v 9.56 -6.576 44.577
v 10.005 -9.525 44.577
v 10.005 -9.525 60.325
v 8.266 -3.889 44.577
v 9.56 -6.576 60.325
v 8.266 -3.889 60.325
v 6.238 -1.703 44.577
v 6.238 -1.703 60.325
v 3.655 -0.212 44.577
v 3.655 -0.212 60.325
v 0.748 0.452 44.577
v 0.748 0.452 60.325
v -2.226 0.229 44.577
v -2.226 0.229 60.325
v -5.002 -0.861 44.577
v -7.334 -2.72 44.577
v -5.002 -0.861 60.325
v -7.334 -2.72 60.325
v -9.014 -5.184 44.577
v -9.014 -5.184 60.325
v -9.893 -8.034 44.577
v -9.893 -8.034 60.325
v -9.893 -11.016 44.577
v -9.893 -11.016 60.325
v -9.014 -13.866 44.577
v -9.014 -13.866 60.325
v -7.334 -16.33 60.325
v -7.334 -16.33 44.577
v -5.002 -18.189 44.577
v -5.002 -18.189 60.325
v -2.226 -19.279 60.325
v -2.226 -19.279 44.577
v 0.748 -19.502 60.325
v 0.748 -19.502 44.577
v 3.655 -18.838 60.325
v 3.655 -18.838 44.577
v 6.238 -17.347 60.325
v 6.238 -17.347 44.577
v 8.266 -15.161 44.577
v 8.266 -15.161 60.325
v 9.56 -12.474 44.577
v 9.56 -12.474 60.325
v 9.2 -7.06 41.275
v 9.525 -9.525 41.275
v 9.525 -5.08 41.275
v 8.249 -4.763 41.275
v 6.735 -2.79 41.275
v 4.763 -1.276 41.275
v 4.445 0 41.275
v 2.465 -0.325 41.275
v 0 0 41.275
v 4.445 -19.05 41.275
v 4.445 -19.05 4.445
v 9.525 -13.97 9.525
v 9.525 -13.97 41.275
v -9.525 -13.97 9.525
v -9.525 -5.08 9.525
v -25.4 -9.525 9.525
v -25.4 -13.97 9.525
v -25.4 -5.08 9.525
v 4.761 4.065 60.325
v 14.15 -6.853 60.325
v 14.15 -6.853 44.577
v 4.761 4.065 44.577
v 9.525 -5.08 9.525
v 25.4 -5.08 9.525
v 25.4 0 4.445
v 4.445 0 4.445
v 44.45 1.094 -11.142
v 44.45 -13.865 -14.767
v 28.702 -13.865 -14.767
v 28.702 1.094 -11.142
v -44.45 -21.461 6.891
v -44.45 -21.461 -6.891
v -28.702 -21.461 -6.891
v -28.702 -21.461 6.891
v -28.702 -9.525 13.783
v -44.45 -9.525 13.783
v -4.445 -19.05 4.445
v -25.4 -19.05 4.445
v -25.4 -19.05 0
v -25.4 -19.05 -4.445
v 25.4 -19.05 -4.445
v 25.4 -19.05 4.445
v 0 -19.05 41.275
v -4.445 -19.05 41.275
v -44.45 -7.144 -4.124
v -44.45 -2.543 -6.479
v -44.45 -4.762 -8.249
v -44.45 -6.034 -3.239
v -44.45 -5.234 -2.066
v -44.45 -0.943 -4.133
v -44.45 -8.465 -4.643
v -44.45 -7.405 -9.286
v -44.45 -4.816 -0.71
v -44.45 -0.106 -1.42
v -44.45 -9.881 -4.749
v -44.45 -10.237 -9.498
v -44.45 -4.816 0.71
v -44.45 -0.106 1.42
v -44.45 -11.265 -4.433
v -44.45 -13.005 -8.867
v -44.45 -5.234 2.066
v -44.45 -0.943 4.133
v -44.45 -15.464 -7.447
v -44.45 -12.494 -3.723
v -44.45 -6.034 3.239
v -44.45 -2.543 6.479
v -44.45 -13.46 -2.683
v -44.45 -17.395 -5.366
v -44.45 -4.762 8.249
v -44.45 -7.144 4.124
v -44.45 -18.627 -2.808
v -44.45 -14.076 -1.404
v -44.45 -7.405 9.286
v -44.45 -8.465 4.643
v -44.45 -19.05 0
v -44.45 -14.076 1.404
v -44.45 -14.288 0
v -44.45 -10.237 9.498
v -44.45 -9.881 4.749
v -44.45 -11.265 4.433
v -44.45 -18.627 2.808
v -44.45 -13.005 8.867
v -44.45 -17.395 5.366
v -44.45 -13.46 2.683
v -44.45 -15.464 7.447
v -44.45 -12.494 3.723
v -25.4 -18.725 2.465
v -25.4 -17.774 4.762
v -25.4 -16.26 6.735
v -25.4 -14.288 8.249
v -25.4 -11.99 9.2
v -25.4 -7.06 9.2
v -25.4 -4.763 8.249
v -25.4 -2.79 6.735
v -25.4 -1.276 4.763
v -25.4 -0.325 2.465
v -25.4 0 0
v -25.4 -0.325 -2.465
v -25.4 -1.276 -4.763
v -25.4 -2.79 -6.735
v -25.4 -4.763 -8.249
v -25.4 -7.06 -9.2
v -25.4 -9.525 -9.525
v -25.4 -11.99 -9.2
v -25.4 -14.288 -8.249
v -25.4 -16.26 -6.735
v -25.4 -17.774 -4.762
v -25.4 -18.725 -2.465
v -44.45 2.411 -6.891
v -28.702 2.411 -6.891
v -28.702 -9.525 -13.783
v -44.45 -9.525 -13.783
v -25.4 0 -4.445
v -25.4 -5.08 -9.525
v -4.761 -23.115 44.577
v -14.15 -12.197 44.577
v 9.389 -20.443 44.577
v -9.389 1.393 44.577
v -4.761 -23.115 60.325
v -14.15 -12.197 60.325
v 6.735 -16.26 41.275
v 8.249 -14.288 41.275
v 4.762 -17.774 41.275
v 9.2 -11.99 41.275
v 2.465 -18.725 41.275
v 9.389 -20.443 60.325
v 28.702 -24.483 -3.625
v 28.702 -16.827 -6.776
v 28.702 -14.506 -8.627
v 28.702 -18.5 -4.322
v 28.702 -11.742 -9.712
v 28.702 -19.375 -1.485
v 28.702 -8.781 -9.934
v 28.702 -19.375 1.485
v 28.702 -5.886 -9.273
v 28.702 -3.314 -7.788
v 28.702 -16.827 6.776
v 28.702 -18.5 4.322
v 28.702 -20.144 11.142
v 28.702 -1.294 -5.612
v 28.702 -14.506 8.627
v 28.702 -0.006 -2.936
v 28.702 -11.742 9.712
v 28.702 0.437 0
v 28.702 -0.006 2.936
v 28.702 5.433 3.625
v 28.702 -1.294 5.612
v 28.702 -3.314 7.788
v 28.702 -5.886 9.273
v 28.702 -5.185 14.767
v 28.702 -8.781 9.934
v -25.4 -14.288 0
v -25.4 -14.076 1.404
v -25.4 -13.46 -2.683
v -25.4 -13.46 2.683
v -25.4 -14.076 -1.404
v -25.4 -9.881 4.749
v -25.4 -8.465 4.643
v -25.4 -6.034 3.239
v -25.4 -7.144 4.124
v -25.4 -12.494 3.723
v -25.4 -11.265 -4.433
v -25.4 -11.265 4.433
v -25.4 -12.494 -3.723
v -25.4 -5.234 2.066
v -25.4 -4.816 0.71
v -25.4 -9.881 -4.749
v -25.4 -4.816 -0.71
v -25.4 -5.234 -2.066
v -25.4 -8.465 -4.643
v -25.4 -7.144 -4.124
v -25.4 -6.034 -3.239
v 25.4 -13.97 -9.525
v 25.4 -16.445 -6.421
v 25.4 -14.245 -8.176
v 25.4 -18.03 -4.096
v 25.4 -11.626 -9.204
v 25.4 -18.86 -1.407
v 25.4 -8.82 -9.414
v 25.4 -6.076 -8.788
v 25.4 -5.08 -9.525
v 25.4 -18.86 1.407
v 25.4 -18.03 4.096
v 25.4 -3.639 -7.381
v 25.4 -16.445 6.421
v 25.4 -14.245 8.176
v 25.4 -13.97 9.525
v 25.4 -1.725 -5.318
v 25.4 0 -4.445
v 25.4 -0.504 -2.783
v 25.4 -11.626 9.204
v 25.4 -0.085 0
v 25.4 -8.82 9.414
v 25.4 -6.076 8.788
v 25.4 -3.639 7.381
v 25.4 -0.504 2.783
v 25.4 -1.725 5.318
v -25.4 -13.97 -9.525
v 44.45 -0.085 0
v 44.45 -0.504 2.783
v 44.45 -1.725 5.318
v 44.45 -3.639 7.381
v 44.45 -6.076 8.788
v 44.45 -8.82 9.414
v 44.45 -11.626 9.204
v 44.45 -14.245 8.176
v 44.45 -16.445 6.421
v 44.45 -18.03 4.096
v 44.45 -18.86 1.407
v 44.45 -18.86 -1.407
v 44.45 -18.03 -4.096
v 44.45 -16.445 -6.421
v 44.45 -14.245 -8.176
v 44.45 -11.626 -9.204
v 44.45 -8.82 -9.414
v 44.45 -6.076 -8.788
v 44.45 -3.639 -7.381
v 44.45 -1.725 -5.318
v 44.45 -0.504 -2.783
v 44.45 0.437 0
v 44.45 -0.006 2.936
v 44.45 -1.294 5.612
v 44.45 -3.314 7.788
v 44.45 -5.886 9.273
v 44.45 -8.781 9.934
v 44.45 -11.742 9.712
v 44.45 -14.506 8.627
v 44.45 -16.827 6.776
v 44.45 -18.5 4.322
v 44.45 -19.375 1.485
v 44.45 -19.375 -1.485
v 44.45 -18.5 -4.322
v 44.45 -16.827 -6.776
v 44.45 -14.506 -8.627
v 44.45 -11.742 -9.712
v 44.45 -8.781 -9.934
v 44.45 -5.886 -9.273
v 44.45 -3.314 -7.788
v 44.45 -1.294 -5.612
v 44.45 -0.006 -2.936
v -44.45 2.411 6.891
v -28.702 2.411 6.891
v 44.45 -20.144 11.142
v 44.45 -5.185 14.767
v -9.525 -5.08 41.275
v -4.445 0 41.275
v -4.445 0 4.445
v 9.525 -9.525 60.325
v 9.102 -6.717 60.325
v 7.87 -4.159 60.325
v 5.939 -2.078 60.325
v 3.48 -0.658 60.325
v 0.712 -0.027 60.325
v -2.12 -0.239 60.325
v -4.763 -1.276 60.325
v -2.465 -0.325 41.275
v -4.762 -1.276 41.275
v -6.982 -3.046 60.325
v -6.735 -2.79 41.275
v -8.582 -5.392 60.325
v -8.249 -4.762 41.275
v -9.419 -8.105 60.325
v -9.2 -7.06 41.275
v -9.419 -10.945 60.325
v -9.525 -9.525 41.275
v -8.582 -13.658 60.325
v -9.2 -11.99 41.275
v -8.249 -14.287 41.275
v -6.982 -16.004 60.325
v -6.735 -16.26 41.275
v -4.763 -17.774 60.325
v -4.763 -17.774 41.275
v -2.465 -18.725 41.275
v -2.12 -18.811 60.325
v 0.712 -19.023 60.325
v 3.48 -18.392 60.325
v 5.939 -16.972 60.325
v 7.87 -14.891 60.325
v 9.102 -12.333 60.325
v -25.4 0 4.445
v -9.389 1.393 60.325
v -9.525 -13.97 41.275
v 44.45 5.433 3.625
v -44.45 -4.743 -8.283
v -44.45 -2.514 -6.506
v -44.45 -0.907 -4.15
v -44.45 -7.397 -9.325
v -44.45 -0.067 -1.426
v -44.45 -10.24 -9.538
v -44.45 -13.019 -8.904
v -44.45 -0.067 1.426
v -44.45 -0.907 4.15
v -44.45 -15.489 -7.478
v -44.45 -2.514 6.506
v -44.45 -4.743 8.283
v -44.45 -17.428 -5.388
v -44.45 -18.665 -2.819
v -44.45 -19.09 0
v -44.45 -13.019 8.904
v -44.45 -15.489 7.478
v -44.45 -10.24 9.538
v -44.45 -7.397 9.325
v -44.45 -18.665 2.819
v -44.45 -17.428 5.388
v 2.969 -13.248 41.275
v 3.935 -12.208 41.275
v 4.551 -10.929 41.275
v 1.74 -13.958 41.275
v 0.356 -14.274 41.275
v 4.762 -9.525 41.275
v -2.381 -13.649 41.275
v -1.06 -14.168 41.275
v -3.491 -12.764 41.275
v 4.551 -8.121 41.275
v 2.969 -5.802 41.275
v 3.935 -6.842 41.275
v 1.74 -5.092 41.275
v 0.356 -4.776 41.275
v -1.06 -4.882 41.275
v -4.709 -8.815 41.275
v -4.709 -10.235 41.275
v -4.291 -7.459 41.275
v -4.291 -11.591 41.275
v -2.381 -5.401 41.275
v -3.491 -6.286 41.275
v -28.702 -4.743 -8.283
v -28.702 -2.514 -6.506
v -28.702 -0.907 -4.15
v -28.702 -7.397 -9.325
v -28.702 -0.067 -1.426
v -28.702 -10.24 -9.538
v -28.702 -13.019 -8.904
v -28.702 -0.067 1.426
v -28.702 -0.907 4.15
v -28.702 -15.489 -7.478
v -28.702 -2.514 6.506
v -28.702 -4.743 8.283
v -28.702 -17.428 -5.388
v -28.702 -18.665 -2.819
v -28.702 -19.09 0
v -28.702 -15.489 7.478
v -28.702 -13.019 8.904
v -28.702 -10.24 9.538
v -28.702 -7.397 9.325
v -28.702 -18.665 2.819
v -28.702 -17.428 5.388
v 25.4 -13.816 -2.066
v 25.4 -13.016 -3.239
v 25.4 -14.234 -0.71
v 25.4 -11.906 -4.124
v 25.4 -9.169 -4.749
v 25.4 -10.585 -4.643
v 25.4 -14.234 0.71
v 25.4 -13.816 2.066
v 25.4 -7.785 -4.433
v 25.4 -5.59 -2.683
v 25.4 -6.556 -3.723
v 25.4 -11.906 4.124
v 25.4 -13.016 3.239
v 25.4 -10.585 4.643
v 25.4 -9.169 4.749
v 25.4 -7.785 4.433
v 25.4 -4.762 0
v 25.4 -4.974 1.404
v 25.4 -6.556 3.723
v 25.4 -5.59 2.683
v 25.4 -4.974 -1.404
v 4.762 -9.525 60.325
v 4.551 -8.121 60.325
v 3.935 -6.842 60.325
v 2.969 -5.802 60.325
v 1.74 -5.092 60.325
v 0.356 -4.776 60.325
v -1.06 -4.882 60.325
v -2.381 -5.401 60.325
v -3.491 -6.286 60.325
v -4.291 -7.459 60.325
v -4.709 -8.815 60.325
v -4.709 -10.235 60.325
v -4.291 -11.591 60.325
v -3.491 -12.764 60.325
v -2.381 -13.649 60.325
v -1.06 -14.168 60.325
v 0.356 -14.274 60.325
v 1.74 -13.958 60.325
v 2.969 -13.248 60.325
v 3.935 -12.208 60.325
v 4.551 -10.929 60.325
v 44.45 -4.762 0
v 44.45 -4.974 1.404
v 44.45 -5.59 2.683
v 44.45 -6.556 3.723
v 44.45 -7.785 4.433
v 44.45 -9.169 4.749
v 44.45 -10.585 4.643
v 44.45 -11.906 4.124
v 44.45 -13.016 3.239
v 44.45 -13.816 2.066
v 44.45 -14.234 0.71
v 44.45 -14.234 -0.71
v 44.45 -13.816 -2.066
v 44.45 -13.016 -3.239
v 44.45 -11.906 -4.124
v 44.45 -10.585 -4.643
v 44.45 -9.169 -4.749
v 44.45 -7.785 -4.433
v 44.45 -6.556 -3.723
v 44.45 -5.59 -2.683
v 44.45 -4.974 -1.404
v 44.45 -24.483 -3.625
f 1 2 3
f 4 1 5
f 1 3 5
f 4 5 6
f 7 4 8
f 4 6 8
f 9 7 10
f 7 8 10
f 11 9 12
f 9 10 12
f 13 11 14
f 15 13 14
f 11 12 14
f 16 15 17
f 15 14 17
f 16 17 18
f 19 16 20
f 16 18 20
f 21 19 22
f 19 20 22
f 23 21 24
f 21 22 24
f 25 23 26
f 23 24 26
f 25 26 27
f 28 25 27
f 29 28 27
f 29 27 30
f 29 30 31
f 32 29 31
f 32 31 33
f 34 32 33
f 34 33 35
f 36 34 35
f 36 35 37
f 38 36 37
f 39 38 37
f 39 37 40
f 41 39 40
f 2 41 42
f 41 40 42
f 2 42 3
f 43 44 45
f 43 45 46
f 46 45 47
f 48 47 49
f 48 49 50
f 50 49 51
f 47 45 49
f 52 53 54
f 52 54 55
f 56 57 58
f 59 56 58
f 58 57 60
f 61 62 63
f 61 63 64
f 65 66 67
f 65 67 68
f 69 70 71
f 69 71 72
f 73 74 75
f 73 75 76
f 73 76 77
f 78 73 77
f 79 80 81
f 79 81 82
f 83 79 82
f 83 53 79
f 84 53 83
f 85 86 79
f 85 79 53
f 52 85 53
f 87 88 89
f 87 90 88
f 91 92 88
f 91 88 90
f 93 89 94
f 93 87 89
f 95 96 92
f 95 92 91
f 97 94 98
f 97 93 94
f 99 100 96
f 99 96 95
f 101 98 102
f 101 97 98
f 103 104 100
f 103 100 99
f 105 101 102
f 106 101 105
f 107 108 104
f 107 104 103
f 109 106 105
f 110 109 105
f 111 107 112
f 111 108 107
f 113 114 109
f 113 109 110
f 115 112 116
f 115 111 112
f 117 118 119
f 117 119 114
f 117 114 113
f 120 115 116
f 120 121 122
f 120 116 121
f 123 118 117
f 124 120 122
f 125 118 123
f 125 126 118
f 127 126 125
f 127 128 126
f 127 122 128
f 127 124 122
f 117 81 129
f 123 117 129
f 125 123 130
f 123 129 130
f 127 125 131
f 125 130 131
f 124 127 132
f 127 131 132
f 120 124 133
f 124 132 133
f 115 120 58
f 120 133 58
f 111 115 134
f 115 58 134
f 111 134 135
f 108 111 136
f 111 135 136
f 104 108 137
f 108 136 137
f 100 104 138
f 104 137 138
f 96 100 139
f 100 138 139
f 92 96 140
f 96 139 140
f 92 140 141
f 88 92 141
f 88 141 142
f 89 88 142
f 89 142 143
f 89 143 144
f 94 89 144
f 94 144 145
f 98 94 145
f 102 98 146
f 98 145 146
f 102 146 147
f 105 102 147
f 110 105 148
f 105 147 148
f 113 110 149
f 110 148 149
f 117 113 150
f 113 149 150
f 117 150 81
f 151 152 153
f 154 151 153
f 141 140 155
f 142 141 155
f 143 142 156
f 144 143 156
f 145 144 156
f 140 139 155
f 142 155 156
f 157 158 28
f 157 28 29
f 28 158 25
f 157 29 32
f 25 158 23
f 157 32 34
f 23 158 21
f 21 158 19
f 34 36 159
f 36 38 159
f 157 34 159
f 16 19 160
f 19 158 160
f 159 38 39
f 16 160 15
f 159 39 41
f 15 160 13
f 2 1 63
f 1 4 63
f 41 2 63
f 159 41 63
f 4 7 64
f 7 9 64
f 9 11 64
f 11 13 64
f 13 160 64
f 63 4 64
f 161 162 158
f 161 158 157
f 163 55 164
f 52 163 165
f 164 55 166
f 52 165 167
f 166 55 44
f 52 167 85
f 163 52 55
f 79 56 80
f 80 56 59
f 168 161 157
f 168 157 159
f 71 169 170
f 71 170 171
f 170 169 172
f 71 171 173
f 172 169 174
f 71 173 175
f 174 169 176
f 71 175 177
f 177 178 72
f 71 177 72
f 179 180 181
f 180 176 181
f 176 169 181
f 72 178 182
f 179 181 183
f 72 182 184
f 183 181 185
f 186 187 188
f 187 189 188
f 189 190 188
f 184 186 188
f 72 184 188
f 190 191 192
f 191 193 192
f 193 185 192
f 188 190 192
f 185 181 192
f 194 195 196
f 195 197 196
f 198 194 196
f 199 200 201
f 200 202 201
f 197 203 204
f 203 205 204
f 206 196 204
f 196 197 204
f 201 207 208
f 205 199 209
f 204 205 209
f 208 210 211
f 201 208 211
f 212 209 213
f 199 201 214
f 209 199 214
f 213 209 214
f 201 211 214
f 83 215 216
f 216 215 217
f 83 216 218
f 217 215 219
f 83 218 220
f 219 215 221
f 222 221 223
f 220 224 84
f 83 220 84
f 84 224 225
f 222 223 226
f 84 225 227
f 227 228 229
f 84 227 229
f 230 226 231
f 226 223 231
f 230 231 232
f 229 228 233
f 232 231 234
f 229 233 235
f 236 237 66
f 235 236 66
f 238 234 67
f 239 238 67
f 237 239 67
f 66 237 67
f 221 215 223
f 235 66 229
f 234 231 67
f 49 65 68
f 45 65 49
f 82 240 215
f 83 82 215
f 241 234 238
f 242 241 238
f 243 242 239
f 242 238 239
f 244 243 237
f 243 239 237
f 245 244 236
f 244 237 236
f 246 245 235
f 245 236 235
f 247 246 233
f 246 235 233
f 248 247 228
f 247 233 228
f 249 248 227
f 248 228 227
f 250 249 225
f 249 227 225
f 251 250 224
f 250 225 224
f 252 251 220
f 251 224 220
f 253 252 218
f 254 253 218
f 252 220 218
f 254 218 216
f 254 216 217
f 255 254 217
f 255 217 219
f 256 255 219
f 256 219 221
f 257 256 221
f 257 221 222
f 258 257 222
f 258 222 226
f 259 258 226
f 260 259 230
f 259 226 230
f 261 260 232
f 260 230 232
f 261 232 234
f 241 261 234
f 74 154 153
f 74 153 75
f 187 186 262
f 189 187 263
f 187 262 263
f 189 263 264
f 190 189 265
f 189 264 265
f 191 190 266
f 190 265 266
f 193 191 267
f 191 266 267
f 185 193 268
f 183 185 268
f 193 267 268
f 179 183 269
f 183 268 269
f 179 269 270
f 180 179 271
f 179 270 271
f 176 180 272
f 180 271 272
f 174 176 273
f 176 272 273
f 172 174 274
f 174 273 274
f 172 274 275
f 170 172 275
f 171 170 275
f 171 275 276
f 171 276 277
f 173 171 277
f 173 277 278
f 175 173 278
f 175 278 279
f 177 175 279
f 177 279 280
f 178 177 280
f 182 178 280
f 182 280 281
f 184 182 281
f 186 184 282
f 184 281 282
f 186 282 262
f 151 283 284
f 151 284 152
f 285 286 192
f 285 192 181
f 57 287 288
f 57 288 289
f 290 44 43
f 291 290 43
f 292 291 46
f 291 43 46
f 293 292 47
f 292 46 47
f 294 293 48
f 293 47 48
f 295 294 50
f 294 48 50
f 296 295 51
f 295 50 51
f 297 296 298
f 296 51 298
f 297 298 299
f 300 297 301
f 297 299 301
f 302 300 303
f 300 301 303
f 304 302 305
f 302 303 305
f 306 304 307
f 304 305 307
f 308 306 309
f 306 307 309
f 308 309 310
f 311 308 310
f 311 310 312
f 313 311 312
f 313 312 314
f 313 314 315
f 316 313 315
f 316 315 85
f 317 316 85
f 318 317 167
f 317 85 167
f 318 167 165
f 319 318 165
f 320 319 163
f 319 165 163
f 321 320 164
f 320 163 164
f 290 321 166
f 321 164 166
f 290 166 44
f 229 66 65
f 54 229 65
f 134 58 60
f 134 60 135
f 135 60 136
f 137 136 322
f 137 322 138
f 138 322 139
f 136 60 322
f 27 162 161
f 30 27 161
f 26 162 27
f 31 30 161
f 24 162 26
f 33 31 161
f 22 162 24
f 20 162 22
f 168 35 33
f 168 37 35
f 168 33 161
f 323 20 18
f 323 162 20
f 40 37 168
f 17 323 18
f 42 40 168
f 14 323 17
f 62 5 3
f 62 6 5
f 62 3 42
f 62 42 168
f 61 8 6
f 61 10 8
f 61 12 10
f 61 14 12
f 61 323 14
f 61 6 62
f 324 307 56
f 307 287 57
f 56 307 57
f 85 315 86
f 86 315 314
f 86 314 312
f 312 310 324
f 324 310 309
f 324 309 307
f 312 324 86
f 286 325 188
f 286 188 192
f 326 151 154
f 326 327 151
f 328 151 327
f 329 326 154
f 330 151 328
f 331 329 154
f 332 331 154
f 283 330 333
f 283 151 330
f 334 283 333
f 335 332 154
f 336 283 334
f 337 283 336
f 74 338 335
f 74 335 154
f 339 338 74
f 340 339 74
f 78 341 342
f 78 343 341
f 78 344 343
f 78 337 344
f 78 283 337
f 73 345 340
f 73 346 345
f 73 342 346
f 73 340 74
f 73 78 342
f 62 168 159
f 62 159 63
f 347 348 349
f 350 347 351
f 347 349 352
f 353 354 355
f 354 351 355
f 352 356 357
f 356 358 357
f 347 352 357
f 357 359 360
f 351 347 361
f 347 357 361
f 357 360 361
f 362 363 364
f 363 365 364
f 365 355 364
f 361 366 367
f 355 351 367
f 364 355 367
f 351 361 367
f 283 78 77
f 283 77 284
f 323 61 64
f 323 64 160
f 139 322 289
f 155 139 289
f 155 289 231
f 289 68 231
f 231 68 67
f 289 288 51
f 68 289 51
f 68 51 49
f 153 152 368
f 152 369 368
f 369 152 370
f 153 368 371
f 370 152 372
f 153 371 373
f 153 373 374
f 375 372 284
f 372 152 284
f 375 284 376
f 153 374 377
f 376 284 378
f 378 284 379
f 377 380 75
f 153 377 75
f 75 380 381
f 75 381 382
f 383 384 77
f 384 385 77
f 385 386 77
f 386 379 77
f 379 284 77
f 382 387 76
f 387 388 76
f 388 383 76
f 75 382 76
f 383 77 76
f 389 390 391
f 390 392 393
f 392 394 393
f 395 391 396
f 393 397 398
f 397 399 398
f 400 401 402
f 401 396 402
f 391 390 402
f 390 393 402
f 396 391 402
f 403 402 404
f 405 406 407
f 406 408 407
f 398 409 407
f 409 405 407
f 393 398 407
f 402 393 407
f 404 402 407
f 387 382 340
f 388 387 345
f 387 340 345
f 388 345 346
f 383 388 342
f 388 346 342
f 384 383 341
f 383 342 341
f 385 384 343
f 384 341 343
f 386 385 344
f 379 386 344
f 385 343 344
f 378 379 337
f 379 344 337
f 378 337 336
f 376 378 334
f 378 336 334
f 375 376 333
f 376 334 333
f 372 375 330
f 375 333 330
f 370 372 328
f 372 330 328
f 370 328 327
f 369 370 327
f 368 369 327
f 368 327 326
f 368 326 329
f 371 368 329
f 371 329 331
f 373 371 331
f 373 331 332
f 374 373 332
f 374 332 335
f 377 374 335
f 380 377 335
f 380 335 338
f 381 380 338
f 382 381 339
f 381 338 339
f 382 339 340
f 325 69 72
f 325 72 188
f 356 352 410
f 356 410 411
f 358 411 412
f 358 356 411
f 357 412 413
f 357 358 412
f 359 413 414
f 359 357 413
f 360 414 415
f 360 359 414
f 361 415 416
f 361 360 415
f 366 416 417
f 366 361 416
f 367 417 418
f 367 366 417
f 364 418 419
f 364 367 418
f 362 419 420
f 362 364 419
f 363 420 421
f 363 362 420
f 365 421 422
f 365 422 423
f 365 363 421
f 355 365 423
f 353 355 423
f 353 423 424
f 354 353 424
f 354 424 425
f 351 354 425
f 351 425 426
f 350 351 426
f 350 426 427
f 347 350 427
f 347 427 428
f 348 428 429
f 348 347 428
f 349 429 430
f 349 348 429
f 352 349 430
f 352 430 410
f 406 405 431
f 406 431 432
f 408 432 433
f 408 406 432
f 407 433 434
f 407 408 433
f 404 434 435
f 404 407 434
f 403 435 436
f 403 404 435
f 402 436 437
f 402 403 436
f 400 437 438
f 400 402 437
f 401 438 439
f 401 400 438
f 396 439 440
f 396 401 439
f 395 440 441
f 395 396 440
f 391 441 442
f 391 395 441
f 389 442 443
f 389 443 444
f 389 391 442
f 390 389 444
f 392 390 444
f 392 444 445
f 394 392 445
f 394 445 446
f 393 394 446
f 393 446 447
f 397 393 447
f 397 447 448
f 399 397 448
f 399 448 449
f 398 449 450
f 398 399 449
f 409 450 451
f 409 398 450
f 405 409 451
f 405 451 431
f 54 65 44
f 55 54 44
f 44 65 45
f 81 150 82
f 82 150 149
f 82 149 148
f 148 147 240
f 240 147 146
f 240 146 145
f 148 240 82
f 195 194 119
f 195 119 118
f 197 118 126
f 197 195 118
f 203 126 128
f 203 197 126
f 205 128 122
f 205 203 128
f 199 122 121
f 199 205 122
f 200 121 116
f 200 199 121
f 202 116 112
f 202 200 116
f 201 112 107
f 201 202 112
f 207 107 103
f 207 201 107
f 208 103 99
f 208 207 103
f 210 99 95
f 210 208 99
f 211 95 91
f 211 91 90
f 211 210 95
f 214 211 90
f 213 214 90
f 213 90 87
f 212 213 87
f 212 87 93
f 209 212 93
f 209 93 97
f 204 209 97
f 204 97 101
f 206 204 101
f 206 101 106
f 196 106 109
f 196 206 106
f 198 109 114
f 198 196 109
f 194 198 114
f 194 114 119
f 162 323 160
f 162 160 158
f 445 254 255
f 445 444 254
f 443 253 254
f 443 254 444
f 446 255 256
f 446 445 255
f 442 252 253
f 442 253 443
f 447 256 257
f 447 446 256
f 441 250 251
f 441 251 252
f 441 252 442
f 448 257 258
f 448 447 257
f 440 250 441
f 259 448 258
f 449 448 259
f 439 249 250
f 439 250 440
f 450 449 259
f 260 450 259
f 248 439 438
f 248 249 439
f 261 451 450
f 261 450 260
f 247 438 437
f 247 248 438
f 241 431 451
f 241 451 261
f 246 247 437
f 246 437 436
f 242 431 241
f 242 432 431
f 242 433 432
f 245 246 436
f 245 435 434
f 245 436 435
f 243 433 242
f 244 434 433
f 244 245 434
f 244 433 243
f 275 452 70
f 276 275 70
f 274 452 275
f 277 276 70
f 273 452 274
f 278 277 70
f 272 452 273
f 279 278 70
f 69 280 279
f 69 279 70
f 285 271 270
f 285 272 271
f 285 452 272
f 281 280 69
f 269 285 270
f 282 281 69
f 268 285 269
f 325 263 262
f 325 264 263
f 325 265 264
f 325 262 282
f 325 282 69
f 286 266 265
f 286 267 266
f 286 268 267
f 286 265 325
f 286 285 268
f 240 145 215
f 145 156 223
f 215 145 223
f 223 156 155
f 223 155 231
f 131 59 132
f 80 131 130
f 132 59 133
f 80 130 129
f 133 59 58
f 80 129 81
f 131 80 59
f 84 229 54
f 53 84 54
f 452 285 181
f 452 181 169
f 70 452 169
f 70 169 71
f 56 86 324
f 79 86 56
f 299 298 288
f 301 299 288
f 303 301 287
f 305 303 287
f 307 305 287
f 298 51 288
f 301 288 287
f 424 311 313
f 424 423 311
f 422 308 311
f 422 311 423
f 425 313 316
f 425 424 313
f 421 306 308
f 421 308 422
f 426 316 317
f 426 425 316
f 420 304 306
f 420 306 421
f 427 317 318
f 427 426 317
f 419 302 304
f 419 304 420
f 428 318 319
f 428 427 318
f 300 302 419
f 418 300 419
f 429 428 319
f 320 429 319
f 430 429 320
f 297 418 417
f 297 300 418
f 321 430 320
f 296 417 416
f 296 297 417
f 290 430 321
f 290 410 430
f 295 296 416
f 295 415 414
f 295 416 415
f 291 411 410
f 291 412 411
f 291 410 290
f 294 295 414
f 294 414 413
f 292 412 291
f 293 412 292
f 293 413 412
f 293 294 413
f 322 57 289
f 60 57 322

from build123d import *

# Parameters (mm, degrees)
F1_DEPTH  = 19.05
F2_R      = 9.440271
F2_R_2    = 4.7625
F3_DEPTH  = 19.05
F4_R      = 9.525
F4_R_2    = 4.7625
F5_DEPTH  = 19.05
F6_R      = 9.525
F6_R_2    = 4.7625
F7_DEPTH  = 19.05
F8_SIZE   = 5.08
F9_R      = 9.564723
F10_DEPTH = 15.748
F11_R     = 9.961503
F12_DEPTH = 15.748
F13_R     = 10.00473
F14_DEPTH = 15.748


with BuildPart() as f1:
    # F0 (on Front) → F1 (new body)
    with BuildSketch(Plane.XZ):
        Polygon((-25.4, -9.525), (25.4, -9.525), (25.4, 9.525), (9.525, 9.525), (9.525, 41.275), (-9.525, 41.275), (-9.525, 9.525), (-25.4, 9.525), align=None)
    extrude(amount=F1_DEPTH)

    # F2 (on face) → F3 (join)
    with BuildSketch(Plane.YZ.offset(25.4)):
        with Locations((-9.525, 0)):
            Circle(F2_R)
        with Locations((-9.525, 0)):
            Circle(F2_R_2, mode=Mode.SUBTRACT)
    extrude(amount=F3_DEPTH)

    # F4 (on face) → F5 (join)
    with BuildSketch(Plane(origin=(-25.4, 0, 0), x_dir=(0, -1, 0), z_dir=(-1, 0, 0))):
        with Locations((9.525, 0)):
            Circle(F4_R)
        with Locations((9.525, 0)):
            Circle(F4_R_2, mode=Mode.SUBTRACT)
    extrude(amount=F5_DEPTH)

    # F6 (on face) → F7 (join)
    with BuildSketch(Plane.XY.offset(41.275)):
        with Locations((0, -9.525)):
            Circle(F6_R)
        with Locations((0, -9.525)):
            Circle(F6_R_2, mode=Mode.SUBTRACT)
    extrude(amount=F7_DEPTH)

    # F8
    f8_edges = [f1.edges().sort_by_distance(p)[0] for p in [
        (-9.525, -19.05, 25.4),
        (9.525, -19.05, 25.4),
        (17.4625, -19.05, 9.525),
        (0, 0, -9.525),
        (0, -19.05, -9.525),
        (-17.4625, -19.05, 9.525),
        (-17.4625, 0, 9.525),
        (-9.525, 0, 25.4),
        (9.525, 0, 25.4),
        (17.4625, 0, 9.525),
    ]]
    chamfer(f8_edges, length=F8_SIZE)


with BuildPart() as f10:
    # F9 (on face) → F10 (new body)
    with BuildSketch(Plane(origin=(-44.45, 0, 0), x_dir=(0, -1, 0), z_dir=(-1, 0, 0))):
        Polygon((21.461273, -6.89141), (21.461273, 6.89141), (9.525, 13.78282), (-2.411273, 6.89141), (-2.411273, -6.89141), (9.525, -13.78282), align=None)
        with Locations((9.525, 0)):
            Circle(F9_R, mode=Mode.SUBTRACT)
    extrude(amount=-F10_DEPTH)


with BuildPart() as f12:
    # F11 (on face) → F12 (new body)
    with BuildSketch(Plane.YZ.offset(44.45)):
        Polygon((1.093901, -11.141752), (5.433491, 3.625362), (-5.18541, 14.767114), (-20.143901, 11.141752), (-24.483491, -3.625362), (-13.86459, -14.767114), align=None)
        with Locations((-9.525, 0)):
            Circle(F11_R, mode=Mode.SUBTRACT)
    extrude(amount=-F12_DEPTH)


with BuildPart() as f14:
    # F13 (on face) → F14 (new body)
    with BuildSketch(Plane.XY.offset(60.325)):
        Polygon((9.388564, -20.443068), (14.149606, -6.853299), (4.761042, 4.064769), (-9.388564, 1.393068), (-14.149606, -12.196701), (-4.761042, -23.114769), align=None)
        with Locations((0, -9.525)):
            Circle(F13_R, mode=Mode.SUBTRACT)
    extrude(amount=-F14_DEPTH)


solid = Compound([f1.part, f10.part, f12.part, f14.part])
